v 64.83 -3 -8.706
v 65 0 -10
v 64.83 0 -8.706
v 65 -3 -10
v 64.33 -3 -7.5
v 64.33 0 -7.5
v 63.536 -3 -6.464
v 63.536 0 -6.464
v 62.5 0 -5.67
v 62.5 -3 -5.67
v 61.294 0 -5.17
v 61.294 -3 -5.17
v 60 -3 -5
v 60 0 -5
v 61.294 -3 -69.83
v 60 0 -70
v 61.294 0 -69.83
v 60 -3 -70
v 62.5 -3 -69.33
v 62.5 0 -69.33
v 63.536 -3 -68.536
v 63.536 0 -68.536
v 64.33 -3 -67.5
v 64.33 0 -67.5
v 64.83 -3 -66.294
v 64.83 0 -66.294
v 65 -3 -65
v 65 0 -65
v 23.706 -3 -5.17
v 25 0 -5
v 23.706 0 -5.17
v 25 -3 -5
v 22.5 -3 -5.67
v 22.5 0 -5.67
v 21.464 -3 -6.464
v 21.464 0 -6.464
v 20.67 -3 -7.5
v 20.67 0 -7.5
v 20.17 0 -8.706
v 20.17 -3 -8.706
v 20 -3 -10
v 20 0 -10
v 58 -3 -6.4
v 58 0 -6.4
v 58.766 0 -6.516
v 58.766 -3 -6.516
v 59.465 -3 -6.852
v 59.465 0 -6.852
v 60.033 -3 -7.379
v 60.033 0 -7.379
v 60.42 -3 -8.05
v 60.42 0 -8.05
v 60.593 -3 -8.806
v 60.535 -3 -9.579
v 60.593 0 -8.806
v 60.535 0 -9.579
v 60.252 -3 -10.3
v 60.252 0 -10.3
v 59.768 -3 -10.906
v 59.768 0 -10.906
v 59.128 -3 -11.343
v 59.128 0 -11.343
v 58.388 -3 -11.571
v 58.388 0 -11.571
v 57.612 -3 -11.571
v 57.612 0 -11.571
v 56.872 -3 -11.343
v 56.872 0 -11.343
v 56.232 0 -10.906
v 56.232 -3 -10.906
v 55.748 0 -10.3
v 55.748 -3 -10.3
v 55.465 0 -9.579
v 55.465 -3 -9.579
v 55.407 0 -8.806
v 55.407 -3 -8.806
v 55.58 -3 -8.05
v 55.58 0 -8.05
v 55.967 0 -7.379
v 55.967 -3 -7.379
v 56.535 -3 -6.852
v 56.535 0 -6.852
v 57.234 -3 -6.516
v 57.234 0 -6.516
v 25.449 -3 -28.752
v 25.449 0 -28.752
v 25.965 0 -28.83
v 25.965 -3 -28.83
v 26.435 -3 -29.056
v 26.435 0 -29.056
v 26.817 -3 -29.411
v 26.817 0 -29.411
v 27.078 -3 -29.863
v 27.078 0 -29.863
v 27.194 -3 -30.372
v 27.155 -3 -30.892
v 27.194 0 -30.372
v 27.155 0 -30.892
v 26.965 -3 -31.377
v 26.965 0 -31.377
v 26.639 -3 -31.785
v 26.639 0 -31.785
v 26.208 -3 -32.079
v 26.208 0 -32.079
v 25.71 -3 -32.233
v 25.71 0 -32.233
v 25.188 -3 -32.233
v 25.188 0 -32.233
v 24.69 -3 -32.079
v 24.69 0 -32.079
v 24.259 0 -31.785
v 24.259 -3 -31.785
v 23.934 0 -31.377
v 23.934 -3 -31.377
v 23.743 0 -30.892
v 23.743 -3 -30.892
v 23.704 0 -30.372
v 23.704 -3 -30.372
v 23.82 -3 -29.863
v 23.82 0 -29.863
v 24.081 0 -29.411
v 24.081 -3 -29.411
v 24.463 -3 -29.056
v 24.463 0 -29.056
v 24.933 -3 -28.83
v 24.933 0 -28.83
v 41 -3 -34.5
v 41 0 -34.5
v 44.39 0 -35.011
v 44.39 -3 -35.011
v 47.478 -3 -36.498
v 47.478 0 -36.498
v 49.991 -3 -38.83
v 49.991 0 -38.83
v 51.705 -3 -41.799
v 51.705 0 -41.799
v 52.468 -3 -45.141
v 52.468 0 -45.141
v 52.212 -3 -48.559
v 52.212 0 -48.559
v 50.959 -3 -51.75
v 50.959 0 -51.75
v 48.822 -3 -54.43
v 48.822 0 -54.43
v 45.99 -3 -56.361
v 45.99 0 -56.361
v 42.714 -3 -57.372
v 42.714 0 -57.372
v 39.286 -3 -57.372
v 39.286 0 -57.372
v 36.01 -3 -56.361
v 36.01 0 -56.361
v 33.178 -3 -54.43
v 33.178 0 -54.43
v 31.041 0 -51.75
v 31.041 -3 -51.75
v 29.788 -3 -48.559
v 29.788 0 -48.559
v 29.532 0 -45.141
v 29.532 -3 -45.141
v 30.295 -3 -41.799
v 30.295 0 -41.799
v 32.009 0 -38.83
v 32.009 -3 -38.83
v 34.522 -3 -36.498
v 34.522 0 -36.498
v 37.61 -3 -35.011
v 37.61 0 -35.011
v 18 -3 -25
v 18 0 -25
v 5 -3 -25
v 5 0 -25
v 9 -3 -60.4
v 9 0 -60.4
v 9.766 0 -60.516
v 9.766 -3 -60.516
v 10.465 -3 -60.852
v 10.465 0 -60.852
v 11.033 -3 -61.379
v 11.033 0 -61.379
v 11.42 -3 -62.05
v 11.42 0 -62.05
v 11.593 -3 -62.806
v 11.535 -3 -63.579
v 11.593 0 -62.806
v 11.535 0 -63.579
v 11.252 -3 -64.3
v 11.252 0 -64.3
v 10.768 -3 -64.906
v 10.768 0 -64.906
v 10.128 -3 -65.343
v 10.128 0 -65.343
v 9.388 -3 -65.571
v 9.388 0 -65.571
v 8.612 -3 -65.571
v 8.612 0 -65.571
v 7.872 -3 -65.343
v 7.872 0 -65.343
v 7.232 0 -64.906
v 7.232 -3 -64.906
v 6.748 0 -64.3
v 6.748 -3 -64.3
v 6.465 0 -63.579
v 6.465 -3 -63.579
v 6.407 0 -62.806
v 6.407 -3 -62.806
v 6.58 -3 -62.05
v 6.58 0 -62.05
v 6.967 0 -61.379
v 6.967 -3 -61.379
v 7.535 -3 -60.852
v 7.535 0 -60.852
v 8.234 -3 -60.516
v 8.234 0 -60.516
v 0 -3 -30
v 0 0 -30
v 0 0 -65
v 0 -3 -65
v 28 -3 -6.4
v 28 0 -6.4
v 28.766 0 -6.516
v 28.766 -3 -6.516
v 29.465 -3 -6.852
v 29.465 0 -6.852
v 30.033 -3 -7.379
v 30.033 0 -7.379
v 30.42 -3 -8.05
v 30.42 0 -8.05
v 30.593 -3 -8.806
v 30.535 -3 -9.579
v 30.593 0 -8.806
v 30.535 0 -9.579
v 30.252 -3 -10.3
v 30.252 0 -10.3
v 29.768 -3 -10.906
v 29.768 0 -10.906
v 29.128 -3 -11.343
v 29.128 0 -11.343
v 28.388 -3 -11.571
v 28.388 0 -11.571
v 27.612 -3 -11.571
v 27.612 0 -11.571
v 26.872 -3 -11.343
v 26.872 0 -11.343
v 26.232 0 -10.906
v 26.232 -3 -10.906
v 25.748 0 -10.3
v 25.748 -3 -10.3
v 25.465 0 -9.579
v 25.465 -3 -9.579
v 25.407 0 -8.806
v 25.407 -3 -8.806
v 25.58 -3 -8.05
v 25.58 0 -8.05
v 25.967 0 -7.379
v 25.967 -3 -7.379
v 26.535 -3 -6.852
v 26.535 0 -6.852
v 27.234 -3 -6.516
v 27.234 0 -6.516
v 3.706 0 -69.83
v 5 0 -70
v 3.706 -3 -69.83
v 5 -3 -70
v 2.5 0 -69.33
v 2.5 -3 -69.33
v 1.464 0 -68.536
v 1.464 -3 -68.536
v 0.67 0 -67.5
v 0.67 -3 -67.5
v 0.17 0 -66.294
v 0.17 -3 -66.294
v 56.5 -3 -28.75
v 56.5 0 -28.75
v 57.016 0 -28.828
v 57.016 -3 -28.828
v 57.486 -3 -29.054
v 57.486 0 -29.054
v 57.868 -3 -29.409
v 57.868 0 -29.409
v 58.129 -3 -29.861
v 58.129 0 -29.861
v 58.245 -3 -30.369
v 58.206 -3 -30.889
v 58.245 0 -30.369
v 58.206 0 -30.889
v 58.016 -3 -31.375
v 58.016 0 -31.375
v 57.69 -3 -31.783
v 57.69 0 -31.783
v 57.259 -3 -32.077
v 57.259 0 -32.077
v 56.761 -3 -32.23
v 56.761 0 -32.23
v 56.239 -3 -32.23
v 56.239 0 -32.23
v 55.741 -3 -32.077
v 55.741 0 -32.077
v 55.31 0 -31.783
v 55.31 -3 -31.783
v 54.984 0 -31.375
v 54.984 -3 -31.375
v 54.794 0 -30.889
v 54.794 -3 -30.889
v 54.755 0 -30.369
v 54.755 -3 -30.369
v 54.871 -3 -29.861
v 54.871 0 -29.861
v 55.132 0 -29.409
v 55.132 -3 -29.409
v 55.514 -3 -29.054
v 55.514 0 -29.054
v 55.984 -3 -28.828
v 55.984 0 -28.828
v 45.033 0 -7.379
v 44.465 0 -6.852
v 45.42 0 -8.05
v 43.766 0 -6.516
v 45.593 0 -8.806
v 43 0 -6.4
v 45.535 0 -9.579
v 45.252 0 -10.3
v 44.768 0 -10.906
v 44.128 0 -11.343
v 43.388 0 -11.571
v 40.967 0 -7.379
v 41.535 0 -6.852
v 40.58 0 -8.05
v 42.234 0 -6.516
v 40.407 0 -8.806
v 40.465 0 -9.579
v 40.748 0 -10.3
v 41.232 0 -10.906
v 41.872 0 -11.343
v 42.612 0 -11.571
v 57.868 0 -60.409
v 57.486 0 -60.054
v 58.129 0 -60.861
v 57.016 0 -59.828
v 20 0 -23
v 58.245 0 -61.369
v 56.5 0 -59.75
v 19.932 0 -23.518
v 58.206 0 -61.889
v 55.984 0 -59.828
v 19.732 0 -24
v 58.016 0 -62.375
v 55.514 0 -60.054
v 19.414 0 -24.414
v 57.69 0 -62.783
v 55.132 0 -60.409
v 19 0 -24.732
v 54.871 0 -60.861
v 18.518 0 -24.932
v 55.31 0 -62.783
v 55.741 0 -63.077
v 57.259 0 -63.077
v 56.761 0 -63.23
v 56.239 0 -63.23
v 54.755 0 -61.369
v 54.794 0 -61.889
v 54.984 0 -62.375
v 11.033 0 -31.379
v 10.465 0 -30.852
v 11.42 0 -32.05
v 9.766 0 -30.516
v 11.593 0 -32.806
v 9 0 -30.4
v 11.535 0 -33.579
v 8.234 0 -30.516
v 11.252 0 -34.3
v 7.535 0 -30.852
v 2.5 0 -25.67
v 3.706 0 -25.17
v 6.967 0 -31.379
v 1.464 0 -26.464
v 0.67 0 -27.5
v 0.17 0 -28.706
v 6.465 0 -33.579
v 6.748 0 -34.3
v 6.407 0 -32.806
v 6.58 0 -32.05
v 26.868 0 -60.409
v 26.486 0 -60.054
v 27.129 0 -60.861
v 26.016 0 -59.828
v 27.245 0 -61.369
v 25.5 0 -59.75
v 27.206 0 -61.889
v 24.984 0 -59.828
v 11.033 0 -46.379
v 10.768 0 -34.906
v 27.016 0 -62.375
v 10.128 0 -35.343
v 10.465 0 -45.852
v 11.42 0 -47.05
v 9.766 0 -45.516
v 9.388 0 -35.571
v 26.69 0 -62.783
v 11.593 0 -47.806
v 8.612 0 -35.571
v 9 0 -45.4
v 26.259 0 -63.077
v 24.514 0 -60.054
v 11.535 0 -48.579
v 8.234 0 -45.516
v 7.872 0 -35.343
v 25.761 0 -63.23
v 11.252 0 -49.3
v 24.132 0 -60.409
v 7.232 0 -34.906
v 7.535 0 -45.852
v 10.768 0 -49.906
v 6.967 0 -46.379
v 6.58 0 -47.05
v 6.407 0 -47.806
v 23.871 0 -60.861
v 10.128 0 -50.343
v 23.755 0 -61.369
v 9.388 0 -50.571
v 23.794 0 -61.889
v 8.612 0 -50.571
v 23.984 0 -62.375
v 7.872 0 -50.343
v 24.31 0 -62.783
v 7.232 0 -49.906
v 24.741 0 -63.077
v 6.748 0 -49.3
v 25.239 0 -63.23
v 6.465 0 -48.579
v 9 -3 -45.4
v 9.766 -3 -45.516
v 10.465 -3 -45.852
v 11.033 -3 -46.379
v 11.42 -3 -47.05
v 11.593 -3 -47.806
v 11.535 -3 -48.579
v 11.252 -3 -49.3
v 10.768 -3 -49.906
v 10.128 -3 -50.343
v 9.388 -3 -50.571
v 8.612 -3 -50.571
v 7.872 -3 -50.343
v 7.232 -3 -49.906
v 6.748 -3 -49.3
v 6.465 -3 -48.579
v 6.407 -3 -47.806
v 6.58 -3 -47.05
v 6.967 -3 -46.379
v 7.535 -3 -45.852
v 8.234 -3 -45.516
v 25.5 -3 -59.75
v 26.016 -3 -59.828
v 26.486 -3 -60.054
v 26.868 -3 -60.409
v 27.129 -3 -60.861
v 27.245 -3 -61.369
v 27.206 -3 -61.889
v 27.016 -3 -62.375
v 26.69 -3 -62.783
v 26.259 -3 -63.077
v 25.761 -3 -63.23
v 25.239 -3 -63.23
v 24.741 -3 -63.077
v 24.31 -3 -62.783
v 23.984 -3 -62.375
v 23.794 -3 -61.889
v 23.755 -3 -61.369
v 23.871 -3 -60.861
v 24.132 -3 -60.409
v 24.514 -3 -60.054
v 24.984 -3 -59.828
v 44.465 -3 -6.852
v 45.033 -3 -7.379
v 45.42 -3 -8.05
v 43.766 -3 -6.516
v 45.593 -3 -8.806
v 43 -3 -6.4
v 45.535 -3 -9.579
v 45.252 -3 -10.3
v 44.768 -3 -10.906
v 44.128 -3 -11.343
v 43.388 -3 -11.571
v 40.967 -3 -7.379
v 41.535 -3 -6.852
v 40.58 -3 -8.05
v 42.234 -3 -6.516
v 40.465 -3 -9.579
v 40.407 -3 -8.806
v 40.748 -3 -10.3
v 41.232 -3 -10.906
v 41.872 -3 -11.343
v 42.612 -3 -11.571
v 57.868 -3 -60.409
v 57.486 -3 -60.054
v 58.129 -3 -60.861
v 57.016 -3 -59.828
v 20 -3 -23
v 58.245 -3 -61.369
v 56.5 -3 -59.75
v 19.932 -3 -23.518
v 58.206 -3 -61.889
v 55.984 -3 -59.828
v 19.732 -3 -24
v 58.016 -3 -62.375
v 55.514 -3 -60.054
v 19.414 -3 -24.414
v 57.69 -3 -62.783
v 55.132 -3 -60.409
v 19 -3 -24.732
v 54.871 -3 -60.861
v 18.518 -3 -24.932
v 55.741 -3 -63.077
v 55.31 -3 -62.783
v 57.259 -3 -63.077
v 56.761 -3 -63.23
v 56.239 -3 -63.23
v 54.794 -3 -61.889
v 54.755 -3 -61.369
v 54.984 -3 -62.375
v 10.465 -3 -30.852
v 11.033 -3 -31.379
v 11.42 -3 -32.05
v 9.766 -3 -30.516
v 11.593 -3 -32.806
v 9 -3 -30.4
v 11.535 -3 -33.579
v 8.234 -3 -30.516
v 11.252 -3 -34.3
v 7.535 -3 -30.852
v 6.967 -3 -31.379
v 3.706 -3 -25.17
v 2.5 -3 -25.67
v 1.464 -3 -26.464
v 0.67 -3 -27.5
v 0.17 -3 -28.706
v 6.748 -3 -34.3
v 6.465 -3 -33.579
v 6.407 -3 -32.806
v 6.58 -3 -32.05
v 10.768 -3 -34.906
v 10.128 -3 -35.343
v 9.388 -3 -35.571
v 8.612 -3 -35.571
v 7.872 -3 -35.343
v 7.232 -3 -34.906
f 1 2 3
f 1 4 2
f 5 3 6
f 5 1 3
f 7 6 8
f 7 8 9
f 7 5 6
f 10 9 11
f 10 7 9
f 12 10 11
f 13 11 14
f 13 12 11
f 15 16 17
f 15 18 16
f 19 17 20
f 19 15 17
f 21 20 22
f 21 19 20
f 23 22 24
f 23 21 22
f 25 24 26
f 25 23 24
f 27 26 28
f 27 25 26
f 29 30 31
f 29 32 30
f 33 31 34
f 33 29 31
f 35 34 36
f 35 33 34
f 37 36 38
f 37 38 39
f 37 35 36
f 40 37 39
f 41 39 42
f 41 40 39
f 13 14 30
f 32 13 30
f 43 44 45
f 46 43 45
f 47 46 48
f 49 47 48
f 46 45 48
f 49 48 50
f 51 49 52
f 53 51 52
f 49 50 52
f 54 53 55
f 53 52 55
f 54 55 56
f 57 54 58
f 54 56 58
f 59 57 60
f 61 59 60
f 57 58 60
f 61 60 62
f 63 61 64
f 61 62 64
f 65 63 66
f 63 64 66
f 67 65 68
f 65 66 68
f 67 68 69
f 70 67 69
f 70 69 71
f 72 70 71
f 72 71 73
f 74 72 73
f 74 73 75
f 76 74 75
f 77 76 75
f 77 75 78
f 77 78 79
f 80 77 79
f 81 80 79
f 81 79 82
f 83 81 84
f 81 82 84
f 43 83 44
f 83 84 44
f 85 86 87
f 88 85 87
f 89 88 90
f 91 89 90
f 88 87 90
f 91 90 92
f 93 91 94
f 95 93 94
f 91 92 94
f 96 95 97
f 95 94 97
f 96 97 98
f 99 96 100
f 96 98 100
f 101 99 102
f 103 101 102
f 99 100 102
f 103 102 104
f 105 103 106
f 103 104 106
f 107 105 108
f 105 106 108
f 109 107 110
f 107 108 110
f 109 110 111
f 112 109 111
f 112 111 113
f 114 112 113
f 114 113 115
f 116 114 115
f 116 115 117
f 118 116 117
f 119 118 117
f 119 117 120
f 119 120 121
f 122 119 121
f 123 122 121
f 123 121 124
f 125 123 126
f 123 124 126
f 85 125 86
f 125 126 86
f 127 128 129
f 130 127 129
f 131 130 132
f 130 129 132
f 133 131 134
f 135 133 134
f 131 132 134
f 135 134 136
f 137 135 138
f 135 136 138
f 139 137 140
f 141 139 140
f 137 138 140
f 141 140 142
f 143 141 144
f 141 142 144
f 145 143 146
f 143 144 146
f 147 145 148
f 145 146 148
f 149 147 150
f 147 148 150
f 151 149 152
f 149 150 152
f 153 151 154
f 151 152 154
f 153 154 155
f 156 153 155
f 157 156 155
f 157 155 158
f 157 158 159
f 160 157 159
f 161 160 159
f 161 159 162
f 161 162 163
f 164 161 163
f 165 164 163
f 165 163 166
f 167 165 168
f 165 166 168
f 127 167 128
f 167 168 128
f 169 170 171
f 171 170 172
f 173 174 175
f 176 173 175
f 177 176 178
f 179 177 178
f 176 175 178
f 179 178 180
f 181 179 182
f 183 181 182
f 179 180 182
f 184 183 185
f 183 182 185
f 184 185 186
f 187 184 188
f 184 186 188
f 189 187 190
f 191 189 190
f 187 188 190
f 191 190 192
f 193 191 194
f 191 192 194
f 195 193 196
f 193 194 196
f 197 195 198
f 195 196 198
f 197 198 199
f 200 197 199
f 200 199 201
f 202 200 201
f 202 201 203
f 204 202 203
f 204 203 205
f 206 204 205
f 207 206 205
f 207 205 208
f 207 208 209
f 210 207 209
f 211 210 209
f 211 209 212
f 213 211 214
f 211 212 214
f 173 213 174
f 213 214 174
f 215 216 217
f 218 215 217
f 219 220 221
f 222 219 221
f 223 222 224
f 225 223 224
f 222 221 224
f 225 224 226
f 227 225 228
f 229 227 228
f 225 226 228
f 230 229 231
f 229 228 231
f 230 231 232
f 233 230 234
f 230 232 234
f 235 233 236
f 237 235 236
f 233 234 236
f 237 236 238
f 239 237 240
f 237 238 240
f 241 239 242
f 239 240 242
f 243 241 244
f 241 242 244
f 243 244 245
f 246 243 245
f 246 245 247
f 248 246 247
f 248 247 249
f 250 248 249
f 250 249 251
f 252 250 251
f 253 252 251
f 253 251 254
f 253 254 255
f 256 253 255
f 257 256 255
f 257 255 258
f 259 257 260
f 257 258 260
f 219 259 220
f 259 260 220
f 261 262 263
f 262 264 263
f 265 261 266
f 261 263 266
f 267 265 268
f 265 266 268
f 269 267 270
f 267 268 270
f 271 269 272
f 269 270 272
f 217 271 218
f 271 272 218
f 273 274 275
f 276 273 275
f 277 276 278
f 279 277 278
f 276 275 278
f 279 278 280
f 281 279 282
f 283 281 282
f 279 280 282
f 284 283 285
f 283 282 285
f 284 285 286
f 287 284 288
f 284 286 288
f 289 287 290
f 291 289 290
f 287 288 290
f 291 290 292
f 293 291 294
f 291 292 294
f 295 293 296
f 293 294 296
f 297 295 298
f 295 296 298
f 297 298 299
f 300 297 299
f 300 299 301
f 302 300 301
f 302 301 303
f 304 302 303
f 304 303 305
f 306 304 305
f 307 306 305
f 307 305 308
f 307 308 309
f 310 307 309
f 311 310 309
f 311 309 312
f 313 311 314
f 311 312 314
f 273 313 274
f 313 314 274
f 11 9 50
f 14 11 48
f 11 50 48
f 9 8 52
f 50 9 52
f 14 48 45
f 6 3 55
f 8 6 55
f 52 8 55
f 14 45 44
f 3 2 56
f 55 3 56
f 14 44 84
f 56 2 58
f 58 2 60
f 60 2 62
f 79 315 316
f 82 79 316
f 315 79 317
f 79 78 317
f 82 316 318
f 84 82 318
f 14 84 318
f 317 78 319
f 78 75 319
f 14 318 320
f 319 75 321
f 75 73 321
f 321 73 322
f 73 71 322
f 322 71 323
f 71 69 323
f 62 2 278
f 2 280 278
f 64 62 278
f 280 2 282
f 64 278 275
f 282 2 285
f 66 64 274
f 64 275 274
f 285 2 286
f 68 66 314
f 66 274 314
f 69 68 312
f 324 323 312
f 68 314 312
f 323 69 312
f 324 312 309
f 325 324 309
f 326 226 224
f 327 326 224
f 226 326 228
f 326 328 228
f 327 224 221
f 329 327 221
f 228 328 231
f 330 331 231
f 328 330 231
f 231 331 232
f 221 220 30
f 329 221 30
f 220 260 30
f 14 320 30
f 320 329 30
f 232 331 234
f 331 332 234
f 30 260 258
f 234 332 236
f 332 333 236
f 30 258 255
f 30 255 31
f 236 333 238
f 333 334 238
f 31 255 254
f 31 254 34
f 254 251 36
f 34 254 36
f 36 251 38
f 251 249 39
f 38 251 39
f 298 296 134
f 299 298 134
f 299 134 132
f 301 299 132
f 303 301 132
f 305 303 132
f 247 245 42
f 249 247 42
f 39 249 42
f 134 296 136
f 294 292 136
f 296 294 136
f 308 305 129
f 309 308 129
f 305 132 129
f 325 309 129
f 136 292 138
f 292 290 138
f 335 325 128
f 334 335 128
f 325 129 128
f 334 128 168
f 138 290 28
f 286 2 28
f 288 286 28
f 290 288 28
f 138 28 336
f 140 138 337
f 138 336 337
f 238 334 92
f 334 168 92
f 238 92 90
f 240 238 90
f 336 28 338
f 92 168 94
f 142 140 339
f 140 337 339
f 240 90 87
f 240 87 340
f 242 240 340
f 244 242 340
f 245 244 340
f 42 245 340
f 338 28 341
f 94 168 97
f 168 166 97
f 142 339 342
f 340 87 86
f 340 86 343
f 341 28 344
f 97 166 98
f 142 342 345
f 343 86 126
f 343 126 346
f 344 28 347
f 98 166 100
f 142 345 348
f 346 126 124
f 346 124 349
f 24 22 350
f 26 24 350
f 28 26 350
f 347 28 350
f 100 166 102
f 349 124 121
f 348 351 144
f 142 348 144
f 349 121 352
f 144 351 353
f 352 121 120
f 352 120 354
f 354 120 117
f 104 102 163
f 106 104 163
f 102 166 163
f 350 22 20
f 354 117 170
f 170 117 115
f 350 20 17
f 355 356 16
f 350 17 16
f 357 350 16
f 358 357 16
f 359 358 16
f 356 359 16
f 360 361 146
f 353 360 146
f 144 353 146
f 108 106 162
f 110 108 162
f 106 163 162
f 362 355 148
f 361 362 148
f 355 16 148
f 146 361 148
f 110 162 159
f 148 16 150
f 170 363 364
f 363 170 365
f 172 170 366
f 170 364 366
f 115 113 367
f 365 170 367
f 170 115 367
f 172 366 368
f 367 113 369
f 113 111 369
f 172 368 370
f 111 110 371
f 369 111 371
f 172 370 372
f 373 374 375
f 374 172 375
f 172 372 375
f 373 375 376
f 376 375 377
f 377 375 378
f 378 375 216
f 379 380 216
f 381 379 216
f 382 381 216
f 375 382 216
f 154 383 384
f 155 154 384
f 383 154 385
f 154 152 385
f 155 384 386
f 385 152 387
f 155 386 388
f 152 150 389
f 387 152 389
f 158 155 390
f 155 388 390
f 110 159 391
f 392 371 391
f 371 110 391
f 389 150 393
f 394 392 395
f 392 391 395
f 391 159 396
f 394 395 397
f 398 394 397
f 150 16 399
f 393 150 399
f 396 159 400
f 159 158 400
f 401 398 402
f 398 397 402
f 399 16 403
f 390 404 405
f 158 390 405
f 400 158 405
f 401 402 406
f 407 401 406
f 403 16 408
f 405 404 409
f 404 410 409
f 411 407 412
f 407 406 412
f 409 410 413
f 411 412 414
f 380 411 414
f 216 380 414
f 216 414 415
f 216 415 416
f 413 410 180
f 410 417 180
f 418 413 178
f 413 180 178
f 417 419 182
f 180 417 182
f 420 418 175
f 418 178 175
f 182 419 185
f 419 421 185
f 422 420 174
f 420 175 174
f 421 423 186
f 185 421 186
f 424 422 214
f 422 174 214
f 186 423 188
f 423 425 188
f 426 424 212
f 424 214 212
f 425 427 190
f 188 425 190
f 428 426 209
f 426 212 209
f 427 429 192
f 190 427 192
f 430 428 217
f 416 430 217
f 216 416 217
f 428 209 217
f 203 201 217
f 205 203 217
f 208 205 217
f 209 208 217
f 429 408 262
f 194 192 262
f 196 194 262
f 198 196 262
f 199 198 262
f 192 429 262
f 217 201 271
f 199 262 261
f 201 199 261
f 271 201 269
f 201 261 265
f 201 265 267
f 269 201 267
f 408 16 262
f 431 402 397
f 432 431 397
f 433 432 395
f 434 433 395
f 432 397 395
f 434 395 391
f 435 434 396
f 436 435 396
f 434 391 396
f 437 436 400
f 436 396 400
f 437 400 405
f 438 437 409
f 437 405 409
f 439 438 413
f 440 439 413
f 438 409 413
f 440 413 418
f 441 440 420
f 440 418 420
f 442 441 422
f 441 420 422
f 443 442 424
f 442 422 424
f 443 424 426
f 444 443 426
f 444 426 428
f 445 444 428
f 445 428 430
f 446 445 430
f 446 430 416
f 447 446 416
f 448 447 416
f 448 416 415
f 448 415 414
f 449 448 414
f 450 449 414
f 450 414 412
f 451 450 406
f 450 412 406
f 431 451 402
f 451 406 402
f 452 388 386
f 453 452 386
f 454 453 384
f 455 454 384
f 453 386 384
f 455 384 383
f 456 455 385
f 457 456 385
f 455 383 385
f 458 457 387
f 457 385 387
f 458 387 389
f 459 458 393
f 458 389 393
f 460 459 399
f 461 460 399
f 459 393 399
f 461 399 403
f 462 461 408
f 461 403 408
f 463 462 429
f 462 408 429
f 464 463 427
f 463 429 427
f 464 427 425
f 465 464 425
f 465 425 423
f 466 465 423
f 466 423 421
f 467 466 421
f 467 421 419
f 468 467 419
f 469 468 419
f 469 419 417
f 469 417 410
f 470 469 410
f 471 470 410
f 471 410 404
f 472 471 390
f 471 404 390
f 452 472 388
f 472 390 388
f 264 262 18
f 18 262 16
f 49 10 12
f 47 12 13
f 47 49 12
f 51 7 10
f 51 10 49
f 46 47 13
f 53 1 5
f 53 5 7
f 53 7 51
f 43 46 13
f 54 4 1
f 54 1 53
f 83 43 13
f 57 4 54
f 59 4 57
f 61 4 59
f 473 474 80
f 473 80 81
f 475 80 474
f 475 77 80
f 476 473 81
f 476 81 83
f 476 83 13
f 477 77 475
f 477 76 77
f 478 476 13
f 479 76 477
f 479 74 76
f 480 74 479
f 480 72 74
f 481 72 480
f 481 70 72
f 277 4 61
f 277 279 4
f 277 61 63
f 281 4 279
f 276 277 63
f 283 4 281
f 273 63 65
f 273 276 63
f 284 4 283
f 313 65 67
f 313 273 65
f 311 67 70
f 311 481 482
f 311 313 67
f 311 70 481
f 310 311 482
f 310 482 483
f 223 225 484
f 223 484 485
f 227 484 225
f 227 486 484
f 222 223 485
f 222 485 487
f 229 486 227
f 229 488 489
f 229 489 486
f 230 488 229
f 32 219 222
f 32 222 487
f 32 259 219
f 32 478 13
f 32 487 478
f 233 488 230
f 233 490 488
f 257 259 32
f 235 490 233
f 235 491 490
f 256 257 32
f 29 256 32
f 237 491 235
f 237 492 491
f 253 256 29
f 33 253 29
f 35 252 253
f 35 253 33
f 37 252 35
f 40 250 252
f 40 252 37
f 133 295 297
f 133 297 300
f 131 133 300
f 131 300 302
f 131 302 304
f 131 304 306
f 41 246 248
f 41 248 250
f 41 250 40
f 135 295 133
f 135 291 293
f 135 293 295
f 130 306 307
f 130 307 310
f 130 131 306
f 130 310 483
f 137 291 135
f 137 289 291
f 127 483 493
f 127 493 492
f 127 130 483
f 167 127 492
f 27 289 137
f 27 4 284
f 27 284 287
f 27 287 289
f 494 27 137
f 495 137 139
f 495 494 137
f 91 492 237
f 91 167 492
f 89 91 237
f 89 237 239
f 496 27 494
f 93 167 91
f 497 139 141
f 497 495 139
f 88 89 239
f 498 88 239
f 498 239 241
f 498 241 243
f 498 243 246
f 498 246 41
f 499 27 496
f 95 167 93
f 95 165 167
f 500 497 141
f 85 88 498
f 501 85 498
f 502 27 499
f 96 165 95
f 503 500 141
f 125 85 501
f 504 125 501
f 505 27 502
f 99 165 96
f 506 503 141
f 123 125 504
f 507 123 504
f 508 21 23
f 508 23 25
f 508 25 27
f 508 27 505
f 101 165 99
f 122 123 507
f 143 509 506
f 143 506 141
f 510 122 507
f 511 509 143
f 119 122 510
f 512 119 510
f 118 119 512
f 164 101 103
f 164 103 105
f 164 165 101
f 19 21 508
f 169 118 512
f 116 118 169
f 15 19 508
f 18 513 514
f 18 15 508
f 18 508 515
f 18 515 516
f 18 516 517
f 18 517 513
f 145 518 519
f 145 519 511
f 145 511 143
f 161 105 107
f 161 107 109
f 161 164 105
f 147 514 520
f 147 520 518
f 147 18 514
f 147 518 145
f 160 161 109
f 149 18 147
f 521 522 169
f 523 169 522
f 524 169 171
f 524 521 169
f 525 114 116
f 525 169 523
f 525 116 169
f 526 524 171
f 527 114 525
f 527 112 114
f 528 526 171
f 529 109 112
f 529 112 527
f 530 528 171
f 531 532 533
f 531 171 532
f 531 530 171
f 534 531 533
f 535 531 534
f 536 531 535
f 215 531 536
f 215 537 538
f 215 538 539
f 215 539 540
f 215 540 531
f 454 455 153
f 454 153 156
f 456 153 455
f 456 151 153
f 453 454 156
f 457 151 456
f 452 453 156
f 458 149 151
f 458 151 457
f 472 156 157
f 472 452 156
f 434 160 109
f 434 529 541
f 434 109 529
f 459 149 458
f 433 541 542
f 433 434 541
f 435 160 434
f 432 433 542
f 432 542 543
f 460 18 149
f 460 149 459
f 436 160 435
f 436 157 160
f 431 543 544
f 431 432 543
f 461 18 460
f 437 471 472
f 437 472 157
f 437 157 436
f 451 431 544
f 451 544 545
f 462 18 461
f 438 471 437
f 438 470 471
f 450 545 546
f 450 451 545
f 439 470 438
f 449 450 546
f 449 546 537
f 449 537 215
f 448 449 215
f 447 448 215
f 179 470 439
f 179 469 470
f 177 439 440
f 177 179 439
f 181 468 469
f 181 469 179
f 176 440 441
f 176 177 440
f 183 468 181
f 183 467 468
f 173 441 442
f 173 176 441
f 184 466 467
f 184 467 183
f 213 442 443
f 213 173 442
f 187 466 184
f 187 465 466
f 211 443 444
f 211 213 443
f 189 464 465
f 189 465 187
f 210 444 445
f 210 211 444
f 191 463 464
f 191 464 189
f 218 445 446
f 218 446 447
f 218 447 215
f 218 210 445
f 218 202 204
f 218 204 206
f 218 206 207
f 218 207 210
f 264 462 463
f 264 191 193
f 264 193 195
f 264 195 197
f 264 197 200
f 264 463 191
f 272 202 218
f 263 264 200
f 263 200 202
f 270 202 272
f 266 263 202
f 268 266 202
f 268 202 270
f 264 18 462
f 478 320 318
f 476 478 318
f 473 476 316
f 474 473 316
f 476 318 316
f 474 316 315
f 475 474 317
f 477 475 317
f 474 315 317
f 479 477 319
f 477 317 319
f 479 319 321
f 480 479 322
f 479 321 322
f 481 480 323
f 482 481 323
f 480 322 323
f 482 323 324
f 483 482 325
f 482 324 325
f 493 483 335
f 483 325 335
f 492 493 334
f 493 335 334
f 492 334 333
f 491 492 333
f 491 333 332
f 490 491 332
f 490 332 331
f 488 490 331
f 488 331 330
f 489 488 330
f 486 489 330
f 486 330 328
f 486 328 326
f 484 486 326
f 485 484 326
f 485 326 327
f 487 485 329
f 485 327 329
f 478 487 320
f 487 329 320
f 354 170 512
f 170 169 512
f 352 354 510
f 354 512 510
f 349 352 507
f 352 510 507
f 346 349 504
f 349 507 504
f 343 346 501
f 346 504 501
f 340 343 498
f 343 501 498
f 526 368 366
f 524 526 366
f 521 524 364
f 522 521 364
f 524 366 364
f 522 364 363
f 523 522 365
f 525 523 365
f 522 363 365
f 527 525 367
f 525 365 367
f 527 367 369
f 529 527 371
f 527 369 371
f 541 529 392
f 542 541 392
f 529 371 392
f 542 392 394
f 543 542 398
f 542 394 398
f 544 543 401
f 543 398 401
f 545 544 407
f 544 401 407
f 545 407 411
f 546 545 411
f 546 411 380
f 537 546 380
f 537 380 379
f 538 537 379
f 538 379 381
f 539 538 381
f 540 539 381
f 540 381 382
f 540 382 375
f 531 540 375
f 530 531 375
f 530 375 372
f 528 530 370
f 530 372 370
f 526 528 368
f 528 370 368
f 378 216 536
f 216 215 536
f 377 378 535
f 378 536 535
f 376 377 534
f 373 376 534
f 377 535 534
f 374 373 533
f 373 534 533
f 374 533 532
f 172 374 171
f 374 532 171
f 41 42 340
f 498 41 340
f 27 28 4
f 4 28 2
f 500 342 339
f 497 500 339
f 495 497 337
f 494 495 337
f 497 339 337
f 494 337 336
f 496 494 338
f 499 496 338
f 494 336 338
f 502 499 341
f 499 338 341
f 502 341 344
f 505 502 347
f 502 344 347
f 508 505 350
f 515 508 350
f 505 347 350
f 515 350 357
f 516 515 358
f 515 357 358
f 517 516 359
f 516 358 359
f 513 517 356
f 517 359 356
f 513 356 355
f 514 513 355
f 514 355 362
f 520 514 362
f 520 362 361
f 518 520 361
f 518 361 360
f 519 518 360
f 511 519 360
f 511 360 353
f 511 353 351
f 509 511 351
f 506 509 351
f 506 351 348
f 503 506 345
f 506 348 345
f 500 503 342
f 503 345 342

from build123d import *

# Parameters (mm, degrees)
SKETCH2_R          = 2.6
SKETCH2_R_2        = 1.75
SKETCH2_R_3        = 11.5
BASE_FLANGE1_DEPTH = 3
FILLET1_R          = 5
FILLET2_R          = 2


# Sheet-metal steps are written as plain solids
with BuildPart() as part:
    # Sketch2 → Base-Flange1 (new body)
    with BuildSketch(Plane(origin=(0, 0, 0), x_dir=(1, 0, 0), z_dir=(0, 1, 0))):
        Polygon((0, 70), (65, 70), (65, 5), (20, 5), (20, 25), (0, 25), align=None)
        with Locations(Location((28, 9, 0), (0, 0, 270))):
            Circle(SKETCH2_R, mode=Mode.SUBTRACT)
        with Locations(Location((43, 9, 0), (0, 0, 270))):
            Circle(SKETCH2_R, mode=Mode.SUBTRACT)
        with Locations(Location((58, 9, 0), (0, 0, 270))):
            Circle(SKETCH2_R, mode=Mode.SUBTRACT)
        with Locations(Location((9, 33, 0), (0, 0, 270))):
            Circle(SKETCH2_R, mode=Mode.SUBTRACT)
        with Locations(Location((9, 48, 0), (0, 0, 270))):
            Circle(SKETCH2_R, mode=Mode.SUBTRACT)
        with Locations(Location((9, 63, 0), (0, 0, 270))):
            Circle(SKETCH2_R, mode=Mode.SUBTRACT)
        with Locations(Location((25.5, 61.5, 0), (0, 0, 270))):
            Circle(SKETCH2_R_2, mode=Mode.SUBTRACT)
        with Locations(Location((56.5, 61.5, 0), (0, 0, 270))):
            Circle(SKETCH2_R_2, mode=Mode.SUBTRACT)
        with Locations(Location((56.5, 30.5, 0), (0, 0, 270))):
            Circle(SKETCH2_R_2, mode=Mode.SUBTRACT)
        with Locations(Location((25.44917982, 30.502293897, 0), (0, 0, 270))):
            Circle(SKETCH2_R_2, mode=Mode.SUBTRACT)
        with Locations(Location((41, 46, 0), (0, 0, 270))):
            Circle(SKETCH2_R_3, mode=Mode.SUBTRACT)
    extrude(amount=-BASE_FLANGE1_DEPTH)

    # Fillet1
    fillet1_edges = [part.edges().sort_by_distance(p)[0] for p in [
        (0, -1.5, -25),
        (0, -1.5, -70),
        (65, -1.5, -70),
        (65, -1.5, -5),
        (20, -1.5, -5),
    ]]
    fillet(fillet1_edges, radius=FILLET1_R)

    # Fillet2
    fillet2_edges = [part.edges().sort_by_distance(p)[0] for p in [
        (20, -1.5, -25),
    ]]
    fillet(fillet2_edges, radius=FILLET2_R)


solid = part.part
